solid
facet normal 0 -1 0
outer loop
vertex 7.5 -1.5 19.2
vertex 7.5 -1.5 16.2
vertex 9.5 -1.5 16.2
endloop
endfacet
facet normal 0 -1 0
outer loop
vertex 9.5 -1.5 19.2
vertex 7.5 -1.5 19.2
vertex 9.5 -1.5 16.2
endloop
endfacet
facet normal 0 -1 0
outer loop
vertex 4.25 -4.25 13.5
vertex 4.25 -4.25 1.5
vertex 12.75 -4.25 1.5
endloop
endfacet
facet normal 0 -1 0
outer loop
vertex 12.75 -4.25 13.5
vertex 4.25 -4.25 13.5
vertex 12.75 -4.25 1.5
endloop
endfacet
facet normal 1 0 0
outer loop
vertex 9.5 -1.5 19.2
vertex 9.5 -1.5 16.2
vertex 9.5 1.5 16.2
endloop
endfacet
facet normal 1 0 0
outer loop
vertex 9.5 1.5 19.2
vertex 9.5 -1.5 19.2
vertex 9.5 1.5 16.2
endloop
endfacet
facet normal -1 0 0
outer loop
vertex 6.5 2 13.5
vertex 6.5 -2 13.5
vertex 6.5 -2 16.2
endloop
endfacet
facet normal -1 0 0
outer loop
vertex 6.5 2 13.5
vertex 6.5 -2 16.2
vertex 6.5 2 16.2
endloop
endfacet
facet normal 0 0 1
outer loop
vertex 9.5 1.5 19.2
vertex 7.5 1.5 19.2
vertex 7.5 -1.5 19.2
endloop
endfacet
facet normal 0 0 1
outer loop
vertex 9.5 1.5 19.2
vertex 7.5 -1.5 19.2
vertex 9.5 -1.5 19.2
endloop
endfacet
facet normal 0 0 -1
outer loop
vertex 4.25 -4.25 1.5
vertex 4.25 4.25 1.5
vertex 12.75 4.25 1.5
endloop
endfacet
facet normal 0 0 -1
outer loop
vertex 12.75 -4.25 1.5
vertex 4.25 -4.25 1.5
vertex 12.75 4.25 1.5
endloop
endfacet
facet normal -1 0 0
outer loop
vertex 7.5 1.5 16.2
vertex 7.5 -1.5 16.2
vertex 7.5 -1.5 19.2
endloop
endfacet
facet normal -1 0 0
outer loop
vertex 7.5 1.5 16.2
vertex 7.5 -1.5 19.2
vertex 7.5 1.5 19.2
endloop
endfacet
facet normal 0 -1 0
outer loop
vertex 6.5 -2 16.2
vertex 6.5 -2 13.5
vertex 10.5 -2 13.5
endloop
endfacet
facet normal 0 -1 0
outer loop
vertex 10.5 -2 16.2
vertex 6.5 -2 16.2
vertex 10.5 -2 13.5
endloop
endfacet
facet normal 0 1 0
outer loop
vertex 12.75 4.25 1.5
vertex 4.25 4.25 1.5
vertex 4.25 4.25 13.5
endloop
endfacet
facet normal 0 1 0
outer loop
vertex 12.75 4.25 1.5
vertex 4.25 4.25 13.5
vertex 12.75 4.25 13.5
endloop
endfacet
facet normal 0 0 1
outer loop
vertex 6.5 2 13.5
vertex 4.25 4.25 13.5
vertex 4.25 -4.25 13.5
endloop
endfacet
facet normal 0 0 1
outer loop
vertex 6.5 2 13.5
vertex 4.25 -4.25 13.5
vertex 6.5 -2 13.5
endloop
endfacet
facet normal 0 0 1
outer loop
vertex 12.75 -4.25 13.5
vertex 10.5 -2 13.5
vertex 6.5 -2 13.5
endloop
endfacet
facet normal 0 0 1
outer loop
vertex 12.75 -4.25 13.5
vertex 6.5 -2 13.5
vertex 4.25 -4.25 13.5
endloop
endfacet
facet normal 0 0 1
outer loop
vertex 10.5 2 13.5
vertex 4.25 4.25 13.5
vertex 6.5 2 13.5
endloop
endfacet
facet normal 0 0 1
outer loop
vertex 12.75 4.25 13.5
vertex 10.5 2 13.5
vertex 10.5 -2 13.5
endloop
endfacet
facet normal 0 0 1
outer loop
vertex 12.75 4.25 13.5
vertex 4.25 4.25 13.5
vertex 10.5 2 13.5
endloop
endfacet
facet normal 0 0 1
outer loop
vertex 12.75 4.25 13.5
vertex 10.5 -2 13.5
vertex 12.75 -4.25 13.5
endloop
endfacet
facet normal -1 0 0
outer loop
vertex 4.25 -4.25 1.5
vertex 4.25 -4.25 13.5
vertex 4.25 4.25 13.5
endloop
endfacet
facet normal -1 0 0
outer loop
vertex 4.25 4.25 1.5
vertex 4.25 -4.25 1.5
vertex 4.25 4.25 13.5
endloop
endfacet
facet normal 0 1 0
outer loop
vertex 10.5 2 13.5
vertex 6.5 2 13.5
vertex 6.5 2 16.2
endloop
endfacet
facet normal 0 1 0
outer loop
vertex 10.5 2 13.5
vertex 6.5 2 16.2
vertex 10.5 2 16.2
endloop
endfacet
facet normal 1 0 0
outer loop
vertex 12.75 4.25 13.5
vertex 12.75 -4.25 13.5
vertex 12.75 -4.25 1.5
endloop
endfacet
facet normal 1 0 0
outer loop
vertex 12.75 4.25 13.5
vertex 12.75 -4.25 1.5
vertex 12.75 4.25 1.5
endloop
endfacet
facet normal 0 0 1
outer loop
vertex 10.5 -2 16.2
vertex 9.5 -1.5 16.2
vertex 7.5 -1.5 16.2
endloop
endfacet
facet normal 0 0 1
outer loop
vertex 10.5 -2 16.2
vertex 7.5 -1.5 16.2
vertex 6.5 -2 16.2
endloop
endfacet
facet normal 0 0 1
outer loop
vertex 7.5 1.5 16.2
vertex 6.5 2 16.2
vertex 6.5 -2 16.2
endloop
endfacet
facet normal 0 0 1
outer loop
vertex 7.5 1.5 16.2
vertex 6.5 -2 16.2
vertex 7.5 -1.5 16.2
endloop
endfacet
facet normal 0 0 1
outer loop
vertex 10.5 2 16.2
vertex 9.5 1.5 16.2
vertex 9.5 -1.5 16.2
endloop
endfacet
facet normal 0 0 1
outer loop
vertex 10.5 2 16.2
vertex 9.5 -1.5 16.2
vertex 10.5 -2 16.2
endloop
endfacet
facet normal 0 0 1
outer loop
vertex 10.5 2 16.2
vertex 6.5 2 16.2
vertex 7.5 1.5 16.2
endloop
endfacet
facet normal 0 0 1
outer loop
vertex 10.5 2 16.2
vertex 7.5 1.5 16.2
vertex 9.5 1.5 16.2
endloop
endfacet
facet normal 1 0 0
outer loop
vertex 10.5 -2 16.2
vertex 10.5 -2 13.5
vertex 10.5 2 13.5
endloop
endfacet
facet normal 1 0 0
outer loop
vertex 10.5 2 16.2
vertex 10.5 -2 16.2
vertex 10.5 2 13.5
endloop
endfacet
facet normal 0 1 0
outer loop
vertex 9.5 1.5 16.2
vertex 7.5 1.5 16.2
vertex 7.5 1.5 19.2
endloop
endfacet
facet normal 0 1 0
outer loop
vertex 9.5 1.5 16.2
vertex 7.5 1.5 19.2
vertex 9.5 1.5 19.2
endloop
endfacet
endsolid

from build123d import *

# Parameters (mm, degrees)
BOX075_W     = 4
BOX075_H     = 4
BOX075_DEPTH = 5.5
BOX076_W     = 8.5
BOX076_H     = 8.5
BOX076_DEPTH = 3.5
BOX078_W     = 2
BOX078_H     = 3
BOX078_DEPTH = 3
BOX074_W     = 8.5
BOX074_H     = 8.5
BOX074_DEPTH = 8.5


with BuildPart() as plunger:
    # Box075 → Box075 (new body)
    with BuildSketch(Plane(origin=(-2, -2, 5.7), x_dir=(1, 0, 0), z_dir=(0, 0, 1))):
        with Locations((2, 2)):
            Rectangle(BOX075_W, BOX075_H)
    extrude(amount=BOX075_DEPTH)


with BuildPart() as pins:
    # Box076 → Box076 (new body)
    with BuildSketch(Plane(origin=(-4.25, -4.25, -3.5), x_dir=(1, 0, 0), z_dir=(0, 0, 1))):
        with Locations((4.25, 4.25)):
            Rectangle(BOX076_W, BOX076_H)
    extrude(amount=BOX076_DEPTH)


with BuildPart() as plunger001:
    # Box078 → Box078 (new body)
    with BuildSketch(Plane(origin=(-1, -1.5, 11.2), x_dir=(1, 0, 0), z_dir=(0, 0, 1))):
        with Locations((1, 1.5)):
            Rectangle(BOX078_W, BOX078_H)
    extrude(amount=BOX078_DEPTH)


with BuildPart() as switch001:
    # Box074 → Box074 (new body)
    with BuildSketch(Plane(origin=(-4.25, -4.25, 0), x_dir=(1, 0, 0), z_dir=(0, 0, 1))):
        with Locations((4.25, 4.25)):
            Rectangle(BOX074_W, BOX074_H)
    extrude(amount=BOX074_DEPTH)

    # Fusion024: union plunger, pins, plunger001
    add(plunger.part)
    add(pins.part)
    add(plunger001.part)


with BuildPart() as switch001_1:
    # Body001 placement: moved
    add(switch001.part.moved(Location((8.5, 0, 5))))


solid = switch001_1.part
